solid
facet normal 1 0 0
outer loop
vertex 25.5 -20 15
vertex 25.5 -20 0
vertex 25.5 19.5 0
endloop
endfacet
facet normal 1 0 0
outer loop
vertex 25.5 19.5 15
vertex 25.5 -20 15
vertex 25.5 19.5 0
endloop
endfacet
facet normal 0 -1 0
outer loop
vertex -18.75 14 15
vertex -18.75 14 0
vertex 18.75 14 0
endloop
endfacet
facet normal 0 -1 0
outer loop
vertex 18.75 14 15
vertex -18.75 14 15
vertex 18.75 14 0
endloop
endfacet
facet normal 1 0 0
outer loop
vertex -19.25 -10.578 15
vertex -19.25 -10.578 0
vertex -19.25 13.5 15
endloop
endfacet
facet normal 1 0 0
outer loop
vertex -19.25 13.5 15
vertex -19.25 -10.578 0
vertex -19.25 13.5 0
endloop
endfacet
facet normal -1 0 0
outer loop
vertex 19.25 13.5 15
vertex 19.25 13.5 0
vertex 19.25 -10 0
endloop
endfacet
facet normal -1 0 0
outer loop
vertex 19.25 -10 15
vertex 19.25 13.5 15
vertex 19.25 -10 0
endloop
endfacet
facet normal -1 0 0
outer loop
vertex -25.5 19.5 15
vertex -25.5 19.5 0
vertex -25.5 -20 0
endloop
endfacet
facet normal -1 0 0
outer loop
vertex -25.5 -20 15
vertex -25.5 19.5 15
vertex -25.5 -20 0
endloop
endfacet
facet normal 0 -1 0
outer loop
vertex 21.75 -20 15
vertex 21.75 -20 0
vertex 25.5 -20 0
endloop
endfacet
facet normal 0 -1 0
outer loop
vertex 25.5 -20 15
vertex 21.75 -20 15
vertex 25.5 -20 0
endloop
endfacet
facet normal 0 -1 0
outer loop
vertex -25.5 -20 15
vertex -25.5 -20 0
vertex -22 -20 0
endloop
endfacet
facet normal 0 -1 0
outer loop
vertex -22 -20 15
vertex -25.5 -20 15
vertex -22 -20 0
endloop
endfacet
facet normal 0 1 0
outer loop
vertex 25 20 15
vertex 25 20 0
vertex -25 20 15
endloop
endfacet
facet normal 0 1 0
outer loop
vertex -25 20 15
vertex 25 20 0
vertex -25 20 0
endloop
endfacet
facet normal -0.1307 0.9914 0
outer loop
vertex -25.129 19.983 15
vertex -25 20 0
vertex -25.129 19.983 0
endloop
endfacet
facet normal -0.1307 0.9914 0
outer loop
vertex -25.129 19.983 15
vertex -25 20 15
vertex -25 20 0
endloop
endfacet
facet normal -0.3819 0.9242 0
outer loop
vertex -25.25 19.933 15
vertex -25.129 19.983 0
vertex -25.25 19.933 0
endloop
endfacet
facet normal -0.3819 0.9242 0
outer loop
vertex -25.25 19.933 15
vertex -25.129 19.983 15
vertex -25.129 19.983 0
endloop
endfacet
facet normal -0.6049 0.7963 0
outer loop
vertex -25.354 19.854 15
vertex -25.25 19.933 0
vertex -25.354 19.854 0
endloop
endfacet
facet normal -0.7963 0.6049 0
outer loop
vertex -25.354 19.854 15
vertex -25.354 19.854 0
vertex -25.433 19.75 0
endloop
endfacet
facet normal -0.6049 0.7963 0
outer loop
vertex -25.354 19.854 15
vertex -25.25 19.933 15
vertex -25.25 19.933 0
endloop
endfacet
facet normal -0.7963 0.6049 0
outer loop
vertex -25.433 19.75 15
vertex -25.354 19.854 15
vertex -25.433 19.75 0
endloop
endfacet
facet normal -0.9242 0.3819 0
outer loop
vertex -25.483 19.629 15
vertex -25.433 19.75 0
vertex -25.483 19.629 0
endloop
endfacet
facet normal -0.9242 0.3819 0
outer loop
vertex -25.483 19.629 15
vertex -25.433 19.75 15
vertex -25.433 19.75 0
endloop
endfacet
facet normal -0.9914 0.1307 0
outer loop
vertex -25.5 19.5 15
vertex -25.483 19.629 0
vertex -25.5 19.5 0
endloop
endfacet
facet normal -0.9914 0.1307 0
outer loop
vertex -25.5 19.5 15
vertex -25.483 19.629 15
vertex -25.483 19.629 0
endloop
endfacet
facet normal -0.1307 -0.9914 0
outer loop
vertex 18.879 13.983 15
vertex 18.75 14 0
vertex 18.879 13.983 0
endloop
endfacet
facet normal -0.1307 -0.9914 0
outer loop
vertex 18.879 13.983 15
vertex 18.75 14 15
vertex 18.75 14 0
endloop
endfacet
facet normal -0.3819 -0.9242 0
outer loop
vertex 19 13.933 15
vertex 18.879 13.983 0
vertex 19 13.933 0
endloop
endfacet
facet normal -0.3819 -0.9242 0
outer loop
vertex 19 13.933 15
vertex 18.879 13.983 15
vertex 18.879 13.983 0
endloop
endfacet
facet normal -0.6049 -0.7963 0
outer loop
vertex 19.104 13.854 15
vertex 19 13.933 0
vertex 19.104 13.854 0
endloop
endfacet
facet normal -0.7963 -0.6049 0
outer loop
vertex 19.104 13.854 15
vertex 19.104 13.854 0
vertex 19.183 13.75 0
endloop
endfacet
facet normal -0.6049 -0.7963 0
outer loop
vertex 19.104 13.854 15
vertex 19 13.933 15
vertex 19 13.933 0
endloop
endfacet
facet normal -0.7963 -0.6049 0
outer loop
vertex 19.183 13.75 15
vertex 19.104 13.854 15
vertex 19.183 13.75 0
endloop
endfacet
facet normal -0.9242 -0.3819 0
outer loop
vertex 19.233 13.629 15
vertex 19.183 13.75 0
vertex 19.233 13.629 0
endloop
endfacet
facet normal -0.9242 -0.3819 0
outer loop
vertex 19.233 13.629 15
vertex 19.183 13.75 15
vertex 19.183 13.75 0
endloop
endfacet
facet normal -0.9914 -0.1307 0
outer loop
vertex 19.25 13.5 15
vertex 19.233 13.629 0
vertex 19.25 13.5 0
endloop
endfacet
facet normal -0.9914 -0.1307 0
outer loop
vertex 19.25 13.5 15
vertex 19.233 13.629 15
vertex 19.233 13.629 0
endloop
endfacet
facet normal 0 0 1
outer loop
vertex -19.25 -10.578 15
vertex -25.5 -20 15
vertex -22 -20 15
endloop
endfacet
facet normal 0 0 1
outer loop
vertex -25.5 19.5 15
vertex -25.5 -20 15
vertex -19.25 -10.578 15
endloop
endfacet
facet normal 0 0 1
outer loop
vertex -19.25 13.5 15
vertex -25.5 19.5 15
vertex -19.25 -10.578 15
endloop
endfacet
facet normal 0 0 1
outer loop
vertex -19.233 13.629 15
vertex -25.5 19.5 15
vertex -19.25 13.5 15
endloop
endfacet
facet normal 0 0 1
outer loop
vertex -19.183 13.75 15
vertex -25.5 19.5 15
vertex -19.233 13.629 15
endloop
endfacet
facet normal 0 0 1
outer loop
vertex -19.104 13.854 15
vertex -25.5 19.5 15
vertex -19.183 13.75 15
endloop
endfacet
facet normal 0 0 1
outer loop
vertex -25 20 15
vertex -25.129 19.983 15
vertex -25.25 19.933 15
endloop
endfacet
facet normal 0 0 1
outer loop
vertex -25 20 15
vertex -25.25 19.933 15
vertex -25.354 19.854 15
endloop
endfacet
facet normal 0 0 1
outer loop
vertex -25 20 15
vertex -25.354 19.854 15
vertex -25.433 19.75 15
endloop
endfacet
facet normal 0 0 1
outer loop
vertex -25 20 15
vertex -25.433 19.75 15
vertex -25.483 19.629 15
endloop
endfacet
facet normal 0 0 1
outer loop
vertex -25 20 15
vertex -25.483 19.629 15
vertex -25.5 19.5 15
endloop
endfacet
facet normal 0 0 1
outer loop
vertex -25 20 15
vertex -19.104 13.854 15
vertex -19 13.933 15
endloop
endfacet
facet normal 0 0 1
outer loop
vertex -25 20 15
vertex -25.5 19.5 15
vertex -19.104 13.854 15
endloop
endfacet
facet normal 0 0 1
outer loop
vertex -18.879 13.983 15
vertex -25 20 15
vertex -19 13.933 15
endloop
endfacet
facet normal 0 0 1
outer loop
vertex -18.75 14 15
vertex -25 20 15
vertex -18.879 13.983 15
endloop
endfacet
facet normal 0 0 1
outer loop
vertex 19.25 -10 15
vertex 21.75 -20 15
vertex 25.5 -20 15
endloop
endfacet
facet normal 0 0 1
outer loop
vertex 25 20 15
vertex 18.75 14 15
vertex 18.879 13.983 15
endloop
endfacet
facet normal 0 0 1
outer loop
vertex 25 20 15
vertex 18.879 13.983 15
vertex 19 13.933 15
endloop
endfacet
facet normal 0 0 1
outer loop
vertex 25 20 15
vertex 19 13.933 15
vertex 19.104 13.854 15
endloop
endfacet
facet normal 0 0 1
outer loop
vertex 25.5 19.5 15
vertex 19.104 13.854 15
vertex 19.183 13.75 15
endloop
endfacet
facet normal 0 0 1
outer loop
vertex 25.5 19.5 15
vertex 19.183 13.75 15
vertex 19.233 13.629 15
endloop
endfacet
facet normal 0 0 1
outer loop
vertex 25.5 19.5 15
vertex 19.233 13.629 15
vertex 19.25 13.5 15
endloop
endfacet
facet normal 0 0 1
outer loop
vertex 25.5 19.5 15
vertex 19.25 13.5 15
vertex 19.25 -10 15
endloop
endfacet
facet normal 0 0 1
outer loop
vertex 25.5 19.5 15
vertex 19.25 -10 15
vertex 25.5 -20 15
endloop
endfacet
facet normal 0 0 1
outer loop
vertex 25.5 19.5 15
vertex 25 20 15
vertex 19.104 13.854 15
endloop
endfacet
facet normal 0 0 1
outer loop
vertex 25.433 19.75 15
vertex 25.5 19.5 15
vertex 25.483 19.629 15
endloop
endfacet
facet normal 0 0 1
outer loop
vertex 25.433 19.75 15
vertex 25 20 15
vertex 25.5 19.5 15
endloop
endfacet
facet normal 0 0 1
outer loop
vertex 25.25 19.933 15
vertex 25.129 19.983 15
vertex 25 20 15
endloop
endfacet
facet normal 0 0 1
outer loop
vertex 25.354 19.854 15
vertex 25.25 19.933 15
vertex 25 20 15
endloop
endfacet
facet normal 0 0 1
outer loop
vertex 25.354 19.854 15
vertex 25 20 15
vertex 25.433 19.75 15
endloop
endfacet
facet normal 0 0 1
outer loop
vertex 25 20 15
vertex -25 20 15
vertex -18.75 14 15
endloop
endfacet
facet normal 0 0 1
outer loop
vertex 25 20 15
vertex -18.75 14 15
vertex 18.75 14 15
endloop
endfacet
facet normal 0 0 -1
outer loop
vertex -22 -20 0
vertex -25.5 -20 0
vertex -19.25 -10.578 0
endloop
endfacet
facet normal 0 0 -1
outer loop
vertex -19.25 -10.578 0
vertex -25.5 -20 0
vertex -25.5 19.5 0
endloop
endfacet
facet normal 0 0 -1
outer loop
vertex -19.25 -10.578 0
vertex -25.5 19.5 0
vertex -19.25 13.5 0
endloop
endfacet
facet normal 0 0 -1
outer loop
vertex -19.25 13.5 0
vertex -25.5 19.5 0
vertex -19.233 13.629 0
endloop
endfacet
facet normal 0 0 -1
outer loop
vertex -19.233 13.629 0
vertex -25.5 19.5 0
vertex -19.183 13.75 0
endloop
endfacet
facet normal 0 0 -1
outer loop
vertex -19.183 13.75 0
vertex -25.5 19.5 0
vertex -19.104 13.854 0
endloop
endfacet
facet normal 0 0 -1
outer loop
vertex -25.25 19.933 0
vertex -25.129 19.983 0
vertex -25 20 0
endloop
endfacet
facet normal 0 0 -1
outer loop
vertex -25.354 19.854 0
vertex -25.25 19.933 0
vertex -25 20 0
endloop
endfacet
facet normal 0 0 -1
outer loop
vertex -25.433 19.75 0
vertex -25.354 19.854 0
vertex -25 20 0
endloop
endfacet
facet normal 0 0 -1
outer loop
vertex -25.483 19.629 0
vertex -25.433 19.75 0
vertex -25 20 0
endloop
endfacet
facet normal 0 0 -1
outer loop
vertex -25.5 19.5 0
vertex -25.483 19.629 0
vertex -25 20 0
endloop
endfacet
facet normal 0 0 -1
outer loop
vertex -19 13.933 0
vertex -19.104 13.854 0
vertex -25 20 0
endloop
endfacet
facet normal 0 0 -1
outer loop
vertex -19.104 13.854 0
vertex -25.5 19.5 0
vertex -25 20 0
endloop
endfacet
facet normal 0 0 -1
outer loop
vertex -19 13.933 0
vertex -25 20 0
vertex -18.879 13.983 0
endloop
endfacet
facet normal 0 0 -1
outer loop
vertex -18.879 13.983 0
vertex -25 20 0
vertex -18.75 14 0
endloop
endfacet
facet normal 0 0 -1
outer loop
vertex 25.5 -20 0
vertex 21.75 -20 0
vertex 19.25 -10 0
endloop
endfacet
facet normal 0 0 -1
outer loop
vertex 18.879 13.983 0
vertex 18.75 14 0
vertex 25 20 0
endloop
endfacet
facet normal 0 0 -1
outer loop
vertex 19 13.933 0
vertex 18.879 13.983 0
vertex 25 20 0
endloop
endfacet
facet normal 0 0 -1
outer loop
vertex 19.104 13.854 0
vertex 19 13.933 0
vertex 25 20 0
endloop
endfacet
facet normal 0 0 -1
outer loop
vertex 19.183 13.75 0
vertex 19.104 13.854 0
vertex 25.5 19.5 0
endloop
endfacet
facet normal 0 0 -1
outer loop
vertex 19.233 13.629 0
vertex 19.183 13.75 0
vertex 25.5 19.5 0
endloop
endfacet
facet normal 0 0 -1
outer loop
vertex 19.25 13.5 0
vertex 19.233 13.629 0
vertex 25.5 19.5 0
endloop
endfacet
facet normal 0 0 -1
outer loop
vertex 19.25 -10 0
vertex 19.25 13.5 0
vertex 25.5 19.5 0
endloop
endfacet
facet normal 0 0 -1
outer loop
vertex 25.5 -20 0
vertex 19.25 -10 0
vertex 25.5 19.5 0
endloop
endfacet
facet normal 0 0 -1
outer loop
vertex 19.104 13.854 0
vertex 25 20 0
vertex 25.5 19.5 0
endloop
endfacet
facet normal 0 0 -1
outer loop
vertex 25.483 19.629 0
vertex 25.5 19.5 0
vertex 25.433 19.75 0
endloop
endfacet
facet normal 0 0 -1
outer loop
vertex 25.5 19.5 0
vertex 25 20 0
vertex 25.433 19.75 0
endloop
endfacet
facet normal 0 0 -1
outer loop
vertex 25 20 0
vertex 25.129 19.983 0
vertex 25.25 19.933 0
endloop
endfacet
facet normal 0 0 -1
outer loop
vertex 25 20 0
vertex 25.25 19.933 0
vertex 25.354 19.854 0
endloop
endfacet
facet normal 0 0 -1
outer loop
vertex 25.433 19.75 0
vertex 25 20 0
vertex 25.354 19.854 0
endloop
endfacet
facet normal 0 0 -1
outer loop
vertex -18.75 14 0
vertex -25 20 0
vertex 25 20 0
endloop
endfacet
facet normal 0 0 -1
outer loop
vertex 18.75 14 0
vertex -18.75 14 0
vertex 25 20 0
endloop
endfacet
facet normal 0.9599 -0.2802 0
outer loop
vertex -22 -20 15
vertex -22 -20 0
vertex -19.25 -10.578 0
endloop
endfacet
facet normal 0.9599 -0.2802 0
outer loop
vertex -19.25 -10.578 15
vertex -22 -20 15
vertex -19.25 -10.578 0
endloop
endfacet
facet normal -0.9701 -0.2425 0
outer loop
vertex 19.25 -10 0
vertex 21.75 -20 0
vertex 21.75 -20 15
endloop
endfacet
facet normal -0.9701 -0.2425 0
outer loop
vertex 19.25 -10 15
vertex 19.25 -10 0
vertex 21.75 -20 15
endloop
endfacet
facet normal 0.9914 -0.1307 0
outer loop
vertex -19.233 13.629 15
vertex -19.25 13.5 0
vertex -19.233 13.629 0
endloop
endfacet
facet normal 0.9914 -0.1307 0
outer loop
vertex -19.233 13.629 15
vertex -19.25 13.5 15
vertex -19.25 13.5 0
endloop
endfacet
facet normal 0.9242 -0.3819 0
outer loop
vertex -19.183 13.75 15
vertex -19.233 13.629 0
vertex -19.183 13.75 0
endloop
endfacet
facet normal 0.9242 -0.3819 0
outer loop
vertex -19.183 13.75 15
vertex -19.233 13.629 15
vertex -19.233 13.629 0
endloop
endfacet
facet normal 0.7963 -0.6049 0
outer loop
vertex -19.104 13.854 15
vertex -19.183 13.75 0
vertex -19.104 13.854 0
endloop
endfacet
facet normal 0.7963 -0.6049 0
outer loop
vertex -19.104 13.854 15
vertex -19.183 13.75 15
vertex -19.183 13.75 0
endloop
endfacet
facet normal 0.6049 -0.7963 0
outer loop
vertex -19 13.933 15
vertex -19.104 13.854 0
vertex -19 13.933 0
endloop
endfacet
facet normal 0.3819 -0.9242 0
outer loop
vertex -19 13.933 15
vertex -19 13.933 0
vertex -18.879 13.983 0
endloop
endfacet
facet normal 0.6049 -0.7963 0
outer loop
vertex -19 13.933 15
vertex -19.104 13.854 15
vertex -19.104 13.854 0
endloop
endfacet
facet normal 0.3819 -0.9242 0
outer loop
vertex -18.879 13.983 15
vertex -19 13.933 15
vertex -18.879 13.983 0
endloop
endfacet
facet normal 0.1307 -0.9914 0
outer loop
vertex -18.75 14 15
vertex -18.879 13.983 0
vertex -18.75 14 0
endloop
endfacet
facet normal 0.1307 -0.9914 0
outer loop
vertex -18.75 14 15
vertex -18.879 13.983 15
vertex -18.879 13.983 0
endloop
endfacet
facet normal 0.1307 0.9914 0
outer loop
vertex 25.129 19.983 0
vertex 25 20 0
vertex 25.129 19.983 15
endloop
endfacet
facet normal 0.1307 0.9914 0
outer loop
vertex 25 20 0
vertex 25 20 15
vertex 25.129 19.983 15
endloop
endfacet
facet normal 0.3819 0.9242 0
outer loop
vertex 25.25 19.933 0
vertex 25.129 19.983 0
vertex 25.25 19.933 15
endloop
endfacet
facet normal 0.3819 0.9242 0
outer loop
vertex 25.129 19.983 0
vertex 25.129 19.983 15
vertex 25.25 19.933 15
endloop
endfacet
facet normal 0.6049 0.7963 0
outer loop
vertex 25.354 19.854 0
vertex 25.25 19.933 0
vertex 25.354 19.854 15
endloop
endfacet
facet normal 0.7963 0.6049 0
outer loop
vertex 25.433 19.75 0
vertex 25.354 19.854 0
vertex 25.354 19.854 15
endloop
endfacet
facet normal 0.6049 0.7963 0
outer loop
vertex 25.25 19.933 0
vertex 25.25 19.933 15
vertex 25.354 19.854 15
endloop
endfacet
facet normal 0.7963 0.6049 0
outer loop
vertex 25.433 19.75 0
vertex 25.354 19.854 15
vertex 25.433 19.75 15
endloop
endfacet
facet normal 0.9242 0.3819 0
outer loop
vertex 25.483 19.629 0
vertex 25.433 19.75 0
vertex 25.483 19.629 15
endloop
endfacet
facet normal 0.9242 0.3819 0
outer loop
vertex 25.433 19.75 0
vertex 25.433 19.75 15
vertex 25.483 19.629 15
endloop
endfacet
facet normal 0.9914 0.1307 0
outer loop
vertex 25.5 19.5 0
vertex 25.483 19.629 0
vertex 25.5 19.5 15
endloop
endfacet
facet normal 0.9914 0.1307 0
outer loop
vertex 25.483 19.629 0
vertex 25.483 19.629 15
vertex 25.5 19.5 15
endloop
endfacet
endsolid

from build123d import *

# Parameters (mm, degrees)
F1_DEPTH    = 15
F2_R        = 0.5
F3_T1_DEPTH = 66.9437702684
F4_SIZE2    = 2.5
F4_SIZE     = 10


# Not quite as in the source:
# - a fillet or chamfer that OpenCascade refuses, or shapes differently, is made with other operations: its cross-section is extruded or revolved along the edge and cut away or added


with BuildPart() as f1:
    # F0 (on Top) → F1 (new body)
    with BuildSketch(Plane.XY):
        Polygon((25.5, 20), (-25.5, 20), (-25.5, -20), (-19.5, -20), (-19.25, -14), (-19.25, 14), (19.25, 14), (19.25, -14), (19.25, -20), (25.5, -20), align=None)
    extrude(amount=F1_DEPTH)

    # F2
    f2_edges = [f1.edges().sort_by_distance(p)[0] for p in [
        (-19.25, 14, 7.5),
        (19.25, 14, 7.5),
        (-25.5, 20, 7.5),
        (25.5, 20, 7.5),
    ]]
    fillet(f2_edges, radius=F2_R)

    # F3: chamfer of 10 x 2.5 on 1 edges, made by hand

    # F3_s2 → F3_t1 (cut)
    with BuildSketch(Plane.XY.offset(-25.9718851342)):
        Polygon((-22, -20), (-19.0836945529, -10.0086692691), (-19.5, -20), align=None)
    extrude(amount=F3_T1_DEPTH, mode=Mode.SUBTRACT)

    # F4
    f4_edges = [f1.edges().sort_by_distance(p)[0] for p in [
        (19.25, -20, 7.5),
    ]]
    f4_side = f1.faces().sort_by_distance((19.25, -3.25, 7.5))[0]
    chamfer(f4_edges, length=F4_SIZE, length2=F4_SIZE2, reference=f4_side)


solid = f1.part
